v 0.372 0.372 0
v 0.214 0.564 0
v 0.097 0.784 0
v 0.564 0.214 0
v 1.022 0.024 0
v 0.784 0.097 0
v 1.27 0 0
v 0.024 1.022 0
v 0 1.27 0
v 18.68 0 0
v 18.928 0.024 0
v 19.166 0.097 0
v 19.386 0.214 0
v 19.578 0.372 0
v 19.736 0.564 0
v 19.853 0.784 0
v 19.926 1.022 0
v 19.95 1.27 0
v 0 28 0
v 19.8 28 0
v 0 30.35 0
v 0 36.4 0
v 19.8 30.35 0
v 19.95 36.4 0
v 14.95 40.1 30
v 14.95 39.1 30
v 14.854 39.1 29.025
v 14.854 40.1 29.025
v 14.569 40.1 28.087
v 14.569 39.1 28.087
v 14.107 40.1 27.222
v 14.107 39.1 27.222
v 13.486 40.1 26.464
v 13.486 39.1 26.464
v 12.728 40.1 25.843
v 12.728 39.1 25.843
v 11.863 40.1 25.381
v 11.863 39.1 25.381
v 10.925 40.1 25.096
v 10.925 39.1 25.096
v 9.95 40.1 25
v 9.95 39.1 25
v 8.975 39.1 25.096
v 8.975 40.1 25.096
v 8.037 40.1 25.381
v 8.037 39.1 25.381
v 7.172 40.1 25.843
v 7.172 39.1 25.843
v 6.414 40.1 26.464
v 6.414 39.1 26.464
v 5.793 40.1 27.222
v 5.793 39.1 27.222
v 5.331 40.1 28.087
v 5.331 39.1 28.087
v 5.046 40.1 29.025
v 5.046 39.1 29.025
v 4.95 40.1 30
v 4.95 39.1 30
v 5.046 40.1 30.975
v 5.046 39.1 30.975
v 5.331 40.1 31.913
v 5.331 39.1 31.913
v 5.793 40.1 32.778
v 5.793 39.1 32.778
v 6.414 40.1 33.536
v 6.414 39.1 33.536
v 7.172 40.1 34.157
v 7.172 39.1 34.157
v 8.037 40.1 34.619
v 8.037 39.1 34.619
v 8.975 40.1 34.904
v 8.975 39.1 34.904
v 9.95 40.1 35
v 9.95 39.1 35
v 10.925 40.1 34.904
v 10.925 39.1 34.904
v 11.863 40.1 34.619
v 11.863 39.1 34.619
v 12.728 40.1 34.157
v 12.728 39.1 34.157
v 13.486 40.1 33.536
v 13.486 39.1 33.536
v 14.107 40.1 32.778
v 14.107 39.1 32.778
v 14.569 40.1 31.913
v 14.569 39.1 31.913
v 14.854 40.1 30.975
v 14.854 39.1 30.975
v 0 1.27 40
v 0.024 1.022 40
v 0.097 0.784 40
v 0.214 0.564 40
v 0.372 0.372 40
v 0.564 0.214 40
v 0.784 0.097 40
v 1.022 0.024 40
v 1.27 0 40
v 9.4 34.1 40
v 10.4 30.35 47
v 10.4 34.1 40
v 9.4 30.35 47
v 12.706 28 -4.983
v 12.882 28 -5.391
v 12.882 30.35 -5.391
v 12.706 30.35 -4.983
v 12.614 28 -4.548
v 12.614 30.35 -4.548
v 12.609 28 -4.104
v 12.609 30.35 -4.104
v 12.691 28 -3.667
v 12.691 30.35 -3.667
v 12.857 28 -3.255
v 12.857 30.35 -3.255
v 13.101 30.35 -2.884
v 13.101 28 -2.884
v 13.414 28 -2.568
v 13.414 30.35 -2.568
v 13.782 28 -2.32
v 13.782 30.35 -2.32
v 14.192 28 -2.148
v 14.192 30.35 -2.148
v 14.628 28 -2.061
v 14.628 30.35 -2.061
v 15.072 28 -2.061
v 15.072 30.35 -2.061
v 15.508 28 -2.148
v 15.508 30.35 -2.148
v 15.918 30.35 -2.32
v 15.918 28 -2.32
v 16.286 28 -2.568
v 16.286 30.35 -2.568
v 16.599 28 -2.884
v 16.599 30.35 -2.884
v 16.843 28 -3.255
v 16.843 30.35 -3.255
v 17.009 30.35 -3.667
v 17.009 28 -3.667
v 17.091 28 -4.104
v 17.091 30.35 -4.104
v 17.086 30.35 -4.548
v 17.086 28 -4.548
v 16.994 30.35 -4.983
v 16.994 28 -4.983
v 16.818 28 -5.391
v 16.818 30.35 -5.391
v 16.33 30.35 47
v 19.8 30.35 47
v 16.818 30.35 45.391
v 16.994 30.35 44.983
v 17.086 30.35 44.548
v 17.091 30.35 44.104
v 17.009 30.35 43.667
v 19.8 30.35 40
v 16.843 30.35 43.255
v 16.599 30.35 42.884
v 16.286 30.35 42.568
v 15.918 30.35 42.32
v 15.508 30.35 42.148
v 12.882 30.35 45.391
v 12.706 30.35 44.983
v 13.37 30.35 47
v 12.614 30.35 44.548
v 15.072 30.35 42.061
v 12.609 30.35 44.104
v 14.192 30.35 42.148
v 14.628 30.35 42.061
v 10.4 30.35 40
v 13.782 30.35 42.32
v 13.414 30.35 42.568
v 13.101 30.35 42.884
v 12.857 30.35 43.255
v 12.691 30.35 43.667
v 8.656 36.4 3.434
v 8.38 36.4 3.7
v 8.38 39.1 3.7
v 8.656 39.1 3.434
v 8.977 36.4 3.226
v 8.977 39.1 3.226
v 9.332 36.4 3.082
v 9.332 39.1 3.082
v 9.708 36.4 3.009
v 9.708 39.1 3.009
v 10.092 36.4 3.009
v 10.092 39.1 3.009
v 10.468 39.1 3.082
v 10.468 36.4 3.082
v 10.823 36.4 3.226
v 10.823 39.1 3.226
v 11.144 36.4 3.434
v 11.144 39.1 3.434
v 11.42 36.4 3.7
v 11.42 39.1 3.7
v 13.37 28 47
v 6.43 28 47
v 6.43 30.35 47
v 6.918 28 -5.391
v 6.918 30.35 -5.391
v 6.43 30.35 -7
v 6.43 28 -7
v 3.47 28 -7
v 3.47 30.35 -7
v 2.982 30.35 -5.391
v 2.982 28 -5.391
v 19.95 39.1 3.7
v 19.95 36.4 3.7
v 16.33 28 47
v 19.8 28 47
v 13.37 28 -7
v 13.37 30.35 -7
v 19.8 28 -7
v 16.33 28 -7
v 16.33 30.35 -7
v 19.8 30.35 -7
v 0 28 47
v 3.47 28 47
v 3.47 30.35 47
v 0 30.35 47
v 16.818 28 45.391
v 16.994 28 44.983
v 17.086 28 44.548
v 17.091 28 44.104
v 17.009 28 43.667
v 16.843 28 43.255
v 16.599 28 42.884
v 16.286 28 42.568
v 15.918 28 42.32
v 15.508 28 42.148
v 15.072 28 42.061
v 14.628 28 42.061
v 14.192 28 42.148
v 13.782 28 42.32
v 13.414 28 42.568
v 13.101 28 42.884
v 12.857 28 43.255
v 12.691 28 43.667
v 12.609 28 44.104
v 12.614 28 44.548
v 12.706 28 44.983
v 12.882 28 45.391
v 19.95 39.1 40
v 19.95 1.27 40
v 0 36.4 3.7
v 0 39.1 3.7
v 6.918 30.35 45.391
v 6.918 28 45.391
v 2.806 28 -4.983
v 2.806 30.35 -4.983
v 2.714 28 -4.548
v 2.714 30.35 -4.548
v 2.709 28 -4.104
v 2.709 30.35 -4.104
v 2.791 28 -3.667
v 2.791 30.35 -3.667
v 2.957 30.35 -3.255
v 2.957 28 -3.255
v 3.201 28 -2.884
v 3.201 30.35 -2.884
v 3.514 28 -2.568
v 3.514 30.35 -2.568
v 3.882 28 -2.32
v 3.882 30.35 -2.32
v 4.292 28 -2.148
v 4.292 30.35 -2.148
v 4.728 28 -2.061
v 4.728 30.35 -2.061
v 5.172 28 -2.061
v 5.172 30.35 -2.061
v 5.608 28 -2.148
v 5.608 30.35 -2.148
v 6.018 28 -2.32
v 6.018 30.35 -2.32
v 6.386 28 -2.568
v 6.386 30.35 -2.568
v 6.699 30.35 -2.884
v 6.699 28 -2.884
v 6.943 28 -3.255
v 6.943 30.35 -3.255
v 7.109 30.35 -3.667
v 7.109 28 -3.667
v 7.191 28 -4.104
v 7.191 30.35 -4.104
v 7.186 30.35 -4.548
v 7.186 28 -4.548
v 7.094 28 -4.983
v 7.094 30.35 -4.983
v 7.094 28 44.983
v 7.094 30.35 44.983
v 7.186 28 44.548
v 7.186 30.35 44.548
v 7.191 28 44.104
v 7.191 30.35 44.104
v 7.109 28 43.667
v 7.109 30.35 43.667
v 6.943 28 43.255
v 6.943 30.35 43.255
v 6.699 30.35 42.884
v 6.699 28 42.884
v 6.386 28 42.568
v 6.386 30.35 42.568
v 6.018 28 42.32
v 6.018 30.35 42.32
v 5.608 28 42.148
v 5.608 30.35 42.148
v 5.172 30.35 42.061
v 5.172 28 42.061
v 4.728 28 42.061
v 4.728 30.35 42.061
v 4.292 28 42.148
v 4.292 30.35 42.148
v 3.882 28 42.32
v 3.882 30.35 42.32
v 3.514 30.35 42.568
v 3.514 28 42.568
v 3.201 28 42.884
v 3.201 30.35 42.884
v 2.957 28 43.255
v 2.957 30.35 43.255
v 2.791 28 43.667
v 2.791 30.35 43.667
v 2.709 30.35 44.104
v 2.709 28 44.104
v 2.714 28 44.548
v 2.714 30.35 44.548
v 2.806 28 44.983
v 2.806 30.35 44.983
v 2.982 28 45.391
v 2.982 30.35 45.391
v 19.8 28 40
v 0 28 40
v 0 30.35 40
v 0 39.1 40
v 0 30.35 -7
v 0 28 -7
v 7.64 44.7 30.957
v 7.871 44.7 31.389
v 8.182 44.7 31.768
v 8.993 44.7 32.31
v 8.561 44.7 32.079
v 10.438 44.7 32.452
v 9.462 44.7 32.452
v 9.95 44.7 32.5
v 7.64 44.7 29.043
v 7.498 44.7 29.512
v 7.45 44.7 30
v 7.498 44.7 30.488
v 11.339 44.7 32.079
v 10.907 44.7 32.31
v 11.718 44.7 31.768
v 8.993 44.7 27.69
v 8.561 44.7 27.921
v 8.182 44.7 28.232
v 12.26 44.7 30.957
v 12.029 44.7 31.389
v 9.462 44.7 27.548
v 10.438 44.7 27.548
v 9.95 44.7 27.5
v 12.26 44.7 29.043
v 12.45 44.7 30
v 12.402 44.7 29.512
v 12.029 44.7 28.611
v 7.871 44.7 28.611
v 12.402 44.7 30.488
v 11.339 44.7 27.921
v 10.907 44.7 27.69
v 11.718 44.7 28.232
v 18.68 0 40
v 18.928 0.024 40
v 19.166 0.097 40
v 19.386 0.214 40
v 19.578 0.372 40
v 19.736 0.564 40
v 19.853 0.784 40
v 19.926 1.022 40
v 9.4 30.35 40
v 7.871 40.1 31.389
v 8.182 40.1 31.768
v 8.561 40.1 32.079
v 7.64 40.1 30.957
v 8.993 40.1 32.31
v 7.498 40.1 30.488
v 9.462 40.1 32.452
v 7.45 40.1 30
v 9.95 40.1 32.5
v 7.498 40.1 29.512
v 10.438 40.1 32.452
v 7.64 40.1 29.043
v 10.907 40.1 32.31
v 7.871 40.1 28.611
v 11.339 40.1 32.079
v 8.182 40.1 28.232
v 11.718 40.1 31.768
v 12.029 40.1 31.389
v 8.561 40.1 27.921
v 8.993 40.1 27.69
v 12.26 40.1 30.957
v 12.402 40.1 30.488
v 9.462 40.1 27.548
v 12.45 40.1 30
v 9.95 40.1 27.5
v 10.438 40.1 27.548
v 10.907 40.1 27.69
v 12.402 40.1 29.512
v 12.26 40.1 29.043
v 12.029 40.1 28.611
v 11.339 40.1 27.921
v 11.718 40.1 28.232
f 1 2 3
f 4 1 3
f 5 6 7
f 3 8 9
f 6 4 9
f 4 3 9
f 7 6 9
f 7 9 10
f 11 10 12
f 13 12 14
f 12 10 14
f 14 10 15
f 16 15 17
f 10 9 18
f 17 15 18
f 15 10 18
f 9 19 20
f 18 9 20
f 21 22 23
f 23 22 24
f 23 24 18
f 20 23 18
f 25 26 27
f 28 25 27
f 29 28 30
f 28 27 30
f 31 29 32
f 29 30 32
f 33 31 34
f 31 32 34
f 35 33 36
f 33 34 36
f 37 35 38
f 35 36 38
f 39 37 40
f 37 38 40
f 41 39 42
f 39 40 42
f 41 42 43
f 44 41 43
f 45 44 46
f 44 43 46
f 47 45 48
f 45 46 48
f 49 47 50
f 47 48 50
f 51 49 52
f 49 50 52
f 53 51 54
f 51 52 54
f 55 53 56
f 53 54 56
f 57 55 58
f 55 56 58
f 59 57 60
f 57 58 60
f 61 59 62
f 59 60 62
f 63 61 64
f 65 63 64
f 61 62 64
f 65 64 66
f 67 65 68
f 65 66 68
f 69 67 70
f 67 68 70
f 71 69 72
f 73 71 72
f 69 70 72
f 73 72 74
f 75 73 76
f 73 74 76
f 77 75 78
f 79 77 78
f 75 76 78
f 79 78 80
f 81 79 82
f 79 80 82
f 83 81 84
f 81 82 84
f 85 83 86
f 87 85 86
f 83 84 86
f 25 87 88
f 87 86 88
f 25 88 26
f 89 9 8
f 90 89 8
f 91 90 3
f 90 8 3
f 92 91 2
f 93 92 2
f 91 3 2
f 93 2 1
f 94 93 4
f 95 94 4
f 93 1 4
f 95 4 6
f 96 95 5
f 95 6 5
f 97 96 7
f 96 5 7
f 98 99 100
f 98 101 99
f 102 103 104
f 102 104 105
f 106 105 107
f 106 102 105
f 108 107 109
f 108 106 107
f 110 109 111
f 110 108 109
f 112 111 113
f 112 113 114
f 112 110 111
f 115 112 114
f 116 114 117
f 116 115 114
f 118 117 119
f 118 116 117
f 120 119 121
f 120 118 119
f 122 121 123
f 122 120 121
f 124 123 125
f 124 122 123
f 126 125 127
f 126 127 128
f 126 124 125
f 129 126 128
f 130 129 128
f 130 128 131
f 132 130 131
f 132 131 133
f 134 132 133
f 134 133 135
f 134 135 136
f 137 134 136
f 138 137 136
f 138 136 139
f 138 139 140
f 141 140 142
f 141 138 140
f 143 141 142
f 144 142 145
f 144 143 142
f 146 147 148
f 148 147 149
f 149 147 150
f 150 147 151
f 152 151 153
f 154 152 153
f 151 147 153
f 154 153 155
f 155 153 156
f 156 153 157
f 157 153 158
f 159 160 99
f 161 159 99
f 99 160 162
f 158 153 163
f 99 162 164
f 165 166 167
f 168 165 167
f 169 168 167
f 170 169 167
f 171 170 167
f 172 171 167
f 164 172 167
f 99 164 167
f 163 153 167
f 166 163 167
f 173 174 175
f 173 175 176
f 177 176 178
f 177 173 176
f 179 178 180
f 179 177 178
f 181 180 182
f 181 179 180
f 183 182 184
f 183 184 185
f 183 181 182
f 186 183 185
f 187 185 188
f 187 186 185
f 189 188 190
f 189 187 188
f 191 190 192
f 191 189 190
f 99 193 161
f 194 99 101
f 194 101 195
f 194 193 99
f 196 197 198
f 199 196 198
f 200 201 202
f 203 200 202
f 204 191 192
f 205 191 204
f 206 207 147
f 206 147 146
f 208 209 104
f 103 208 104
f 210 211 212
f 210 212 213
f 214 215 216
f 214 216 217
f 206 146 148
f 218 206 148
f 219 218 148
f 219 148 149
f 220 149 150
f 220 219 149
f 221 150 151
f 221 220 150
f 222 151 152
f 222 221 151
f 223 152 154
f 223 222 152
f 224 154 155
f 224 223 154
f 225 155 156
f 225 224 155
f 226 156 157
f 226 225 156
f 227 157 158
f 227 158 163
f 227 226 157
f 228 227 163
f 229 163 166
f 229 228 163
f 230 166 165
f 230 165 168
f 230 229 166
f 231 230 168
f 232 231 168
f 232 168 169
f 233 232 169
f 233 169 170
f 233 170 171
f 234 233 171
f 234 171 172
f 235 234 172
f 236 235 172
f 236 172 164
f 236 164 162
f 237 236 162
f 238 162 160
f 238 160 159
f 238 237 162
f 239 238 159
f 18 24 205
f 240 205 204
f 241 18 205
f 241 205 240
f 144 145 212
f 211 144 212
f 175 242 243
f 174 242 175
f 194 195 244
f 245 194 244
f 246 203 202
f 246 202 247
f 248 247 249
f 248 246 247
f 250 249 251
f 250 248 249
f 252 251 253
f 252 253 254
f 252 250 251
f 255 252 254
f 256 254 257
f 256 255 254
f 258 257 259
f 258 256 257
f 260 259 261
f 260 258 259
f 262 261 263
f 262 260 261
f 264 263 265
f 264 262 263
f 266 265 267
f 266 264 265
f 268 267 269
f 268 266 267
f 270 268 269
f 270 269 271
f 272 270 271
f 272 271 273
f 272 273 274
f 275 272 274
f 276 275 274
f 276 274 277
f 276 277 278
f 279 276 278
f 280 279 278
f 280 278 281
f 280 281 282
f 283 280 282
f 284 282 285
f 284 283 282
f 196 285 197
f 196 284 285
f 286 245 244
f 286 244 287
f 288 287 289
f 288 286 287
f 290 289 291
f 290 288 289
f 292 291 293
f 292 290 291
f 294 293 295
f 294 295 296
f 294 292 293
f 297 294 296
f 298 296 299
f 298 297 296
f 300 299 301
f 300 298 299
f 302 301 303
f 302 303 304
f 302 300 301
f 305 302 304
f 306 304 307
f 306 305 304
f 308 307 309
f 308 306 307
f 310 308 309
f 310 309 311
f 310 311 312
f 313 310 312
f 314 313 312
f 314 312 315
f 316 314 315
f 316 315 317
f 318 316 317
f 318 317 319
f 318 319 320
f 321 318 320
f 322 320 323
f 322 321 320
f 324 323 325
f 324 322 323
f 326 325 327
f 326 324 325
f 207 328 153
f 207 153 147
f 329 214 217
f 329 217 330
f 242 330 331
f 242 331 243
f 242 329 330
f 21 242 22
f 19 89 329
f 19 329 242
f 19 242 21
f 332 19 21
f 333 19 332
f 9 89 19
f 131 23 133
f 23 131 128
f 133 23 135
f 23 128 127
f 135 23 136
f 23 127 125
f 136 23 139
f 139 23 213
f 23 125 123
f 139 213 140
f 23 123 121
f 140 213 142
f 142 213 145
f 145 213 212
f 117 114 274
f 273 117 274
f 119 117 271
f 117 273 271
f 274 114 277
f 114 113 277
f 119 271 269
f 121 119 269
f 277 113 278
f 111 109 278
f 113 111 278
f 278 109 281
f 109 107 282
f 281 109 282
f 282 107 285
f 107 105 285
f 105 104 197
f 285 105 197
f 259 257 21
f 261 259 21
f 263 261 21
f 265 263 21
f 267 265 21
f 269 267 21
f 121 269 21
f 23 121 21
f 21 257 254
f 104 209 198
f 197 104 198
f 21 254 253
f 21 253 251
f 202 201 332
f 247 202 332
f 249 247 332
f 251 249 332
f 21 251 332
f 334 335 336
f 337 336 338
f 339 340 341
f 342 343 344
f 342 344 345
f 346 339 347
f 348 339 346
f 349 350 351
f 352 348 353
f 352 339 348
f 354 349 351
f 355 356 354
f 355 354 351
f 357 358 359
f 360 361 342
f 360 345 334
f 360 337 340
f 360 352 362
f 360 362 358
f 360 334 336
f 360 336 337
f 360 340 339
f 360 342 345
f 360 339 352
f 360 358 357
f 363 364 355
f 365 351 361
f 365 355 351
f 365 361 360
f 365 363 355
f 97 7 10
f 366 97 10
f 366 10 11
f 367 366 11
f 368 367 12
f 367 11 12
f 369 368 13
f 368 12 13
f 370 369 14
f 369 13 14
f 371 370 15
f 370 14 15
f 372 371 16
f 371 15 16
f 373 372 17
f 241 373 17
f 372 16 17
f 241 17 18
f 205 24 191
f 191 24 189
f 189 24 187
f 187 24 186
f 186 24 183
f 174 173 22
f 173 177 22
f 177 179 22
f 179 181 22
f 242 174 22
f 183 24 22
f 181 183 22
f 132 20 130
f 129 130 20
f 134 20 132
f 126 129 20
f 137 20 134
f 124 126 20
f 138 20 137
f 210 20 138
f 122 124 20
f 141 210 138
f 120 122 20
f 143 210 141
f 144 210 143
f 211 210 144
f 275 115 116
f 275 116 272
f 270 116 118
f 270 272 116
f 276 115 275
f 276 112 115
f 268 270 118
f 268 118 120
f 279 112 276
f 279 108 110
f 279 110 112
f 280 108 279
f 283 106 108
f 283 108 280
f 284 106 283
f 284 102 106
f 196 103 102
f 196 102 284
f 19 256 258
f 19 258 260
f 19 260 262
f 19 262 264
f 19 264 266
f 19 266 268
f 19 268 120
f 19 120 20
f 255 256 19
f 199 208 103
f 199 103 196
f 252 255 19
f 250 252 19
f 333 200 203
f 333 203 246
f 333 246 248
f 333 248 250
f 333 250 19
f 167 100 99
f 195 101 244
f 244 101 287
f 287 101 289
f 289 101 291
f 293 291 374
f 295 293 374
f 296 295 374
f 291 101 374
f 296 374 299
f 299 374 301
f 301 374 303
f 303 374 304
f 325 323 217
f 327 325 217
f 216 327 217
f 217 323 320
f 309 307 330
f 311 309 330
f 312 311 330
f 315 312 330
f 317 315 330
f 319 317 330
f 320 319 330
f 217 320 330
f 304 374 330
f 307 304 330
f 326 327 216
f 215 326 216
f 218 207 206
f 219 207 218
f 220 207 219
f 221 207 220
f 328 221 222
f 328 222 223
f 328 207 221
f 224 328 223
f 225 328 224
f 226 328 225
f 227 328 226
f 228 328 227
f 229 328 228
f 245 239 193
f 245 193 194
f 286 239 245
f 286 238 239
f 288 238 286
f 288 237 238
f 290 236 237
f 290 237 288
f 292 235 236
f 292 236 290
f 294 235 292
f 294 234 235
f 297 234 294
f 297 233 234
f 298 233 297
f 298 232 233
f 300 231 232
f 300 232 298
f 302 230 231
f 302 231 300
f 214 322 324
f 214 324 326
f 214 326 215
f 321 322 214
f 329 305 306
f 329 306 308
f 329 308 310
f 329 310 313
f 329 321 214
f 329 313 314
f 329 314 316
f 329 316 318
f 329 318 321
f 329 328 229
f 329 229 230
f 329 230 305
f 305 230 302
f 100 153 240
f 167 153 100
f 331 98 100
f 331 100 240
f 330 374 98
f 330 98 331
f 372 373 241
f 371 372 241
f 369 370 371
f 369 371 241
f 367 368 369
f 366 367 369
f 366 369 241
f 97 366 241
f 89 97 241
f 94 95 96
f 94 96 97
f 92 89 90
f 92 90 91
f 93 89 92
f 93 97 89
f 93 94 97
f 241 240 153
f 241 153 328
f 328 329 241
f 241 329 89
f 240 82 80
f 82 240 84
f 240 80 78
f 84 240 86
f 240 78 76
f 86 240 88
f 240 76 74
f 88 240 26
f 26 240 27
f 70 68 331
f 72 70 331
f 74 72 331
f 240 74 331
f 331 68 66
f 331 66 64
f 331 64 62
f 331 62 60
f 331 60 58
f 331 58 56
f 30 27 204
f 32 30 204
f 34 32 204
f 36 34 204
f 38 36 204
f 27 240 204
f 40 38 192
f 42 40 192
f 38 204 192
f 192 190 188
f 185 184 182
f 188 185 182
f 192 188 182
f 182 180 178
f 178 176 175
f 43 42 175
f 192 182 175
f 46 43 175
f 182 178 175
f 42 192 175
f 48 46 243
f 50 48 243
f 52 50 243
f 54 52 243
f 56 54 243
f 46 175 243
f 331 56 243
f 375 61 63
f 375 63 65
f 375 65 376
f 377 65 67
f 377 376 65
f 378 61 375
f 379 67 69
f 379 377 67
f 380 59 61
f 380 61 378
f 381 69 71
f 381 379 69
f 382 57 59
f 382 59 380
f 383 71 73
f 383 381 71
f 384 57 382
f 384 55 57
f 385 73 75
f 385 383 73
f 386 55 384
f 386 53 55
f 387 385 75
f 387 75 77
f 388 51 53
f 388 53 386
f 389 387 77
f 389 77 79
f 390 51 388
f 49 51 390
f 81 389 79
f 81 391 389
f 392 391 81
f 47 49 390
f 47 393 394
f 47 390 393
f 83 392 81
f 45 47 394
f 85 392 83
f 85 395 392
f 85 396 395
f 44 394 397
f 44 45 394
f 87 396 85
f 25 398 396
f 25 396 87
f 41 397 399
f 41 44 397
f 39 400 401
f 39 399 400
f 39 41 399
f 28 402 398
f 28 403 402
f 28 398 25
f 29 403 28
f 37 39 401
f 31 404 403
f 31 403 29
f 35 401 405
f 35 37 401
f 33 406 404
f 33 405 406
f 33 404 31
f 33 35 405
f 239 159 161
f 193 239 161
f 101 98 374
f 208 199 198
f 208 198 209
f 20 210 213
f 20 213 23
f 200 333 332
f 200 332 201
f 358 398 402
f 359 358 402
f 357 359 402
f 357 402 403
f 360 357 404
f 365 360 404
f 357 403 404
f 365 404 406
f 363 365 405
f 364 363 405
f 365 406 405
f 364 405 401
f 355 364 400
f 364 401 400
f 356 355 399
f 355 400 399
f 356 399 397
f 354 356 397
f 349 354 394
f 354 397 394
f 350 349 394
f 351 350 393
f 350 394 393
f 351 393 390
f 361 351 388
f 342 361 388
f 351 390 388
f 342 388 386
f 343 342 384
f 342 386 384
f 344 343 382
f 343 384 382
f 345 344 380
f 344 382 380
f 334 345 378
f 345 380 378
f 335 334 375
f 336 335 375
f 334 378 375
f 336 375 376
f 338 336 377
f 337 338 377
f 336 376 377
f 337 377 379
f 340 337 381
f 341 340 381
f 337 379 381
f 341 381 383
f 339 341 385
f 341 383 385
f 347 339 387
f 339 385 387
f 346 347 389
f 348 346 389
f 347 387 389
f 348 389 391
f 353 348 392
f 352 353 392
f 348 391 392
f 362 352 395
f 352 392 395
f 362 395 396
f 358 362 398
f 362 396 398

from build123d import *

# Parameters (mm, degrees)
BOSS_EXTRUDE1_DEPTH = 40
BOSS_EXTRUDE3_DEPTH = 2.35
BOSS_EXTRUDE4_DEPTH = 2.7
SKETCH7_R           = 5
BOSS_EXTRUDE5_DEPTH = 1
SKETCH8_R           = 2.5
BOSS_EXTRUDE6_DEPTH = 4.6
BOSS_EXTRUDE7_DEPTH = 0.5


with BuildPart() as part:
    # Sketch1 → Boss-Extrude1 (new body)
    with BuildSketch(Plane.XY):
        with BuildLine():
            Line((1.27, 0), (18.68, 0))
            ThreePointArc((18.68, 0), (19.578025612, 0.371974388), (19.95, 1.27))
            Line((19.95, 1.27), (19.95, 36.4))
            Line((19.95, 36.4), (0, 36.4))
            Line((0, 36.4), (0, 1.27))
            ThreePointArc((0, 1.27), (0.371974388, 0.371974388), (1.27, 0))
        make_face()
    extrude(amount=BOSS_EXTRUDE1_DEPTH)

    # Sketch5 → Boss-Extrude3 (add)
    with BuildSketch(Plane(origin=(0, 28, 0), x_dir=(-1, 0, 0), z_dir=(0, -1, 0))):
        with BuildLine():
            Line((0, 0), (0, 7))
            Line((0, 7), (-3.470401751, 7))
            Line((-3.470401751, 7), (-2.98203275, 5.390690104))
            ThreePointArc((-2.98203275, 5.390690104), (-4.95, 2.05), (-6.91796725, 5.390690104))
            Line((-6.91796725, 5.390690104), (-6.429598249, 7))
            Line((-6.429598249, 7), (-13.370401751, 7))
            Line((-13.370401751, 7), (-12.88203275, 5.390690104))
            ThreePointArc((-12.88203275, 5.390690104), (-14.85, 2.05), (-16.81796725, 5.390690104))
            Line((-16.81796725, 5.390690104), (-16.329598249, 7))
            Line((-16.329598249, 7), (-19.8, 7))
            Line((-19.8, 7), (-19.8, 0))
            Line((-19.8, 0), (0, 0))
        make_face()
        with BuildLine():
            Line((-16.329598249, -47), (-16.81796725, -45.390690104))
            ThreePointArc((-16.81796725, -45.390690104), (-14.85, -42.05), (-12.88203275, -45.390690104))
            Line((-12.88203275, -45.390690104), (-13.370401751, -47))
            Line((-13.370401751, -47), (-6.429598249, -47))
            Line((-6.429598249, -47), (-6.91796725, -45.390690104))
            ThreePointArc((-6.91796725, -45.390690104), (-4.95, -42.05), (-2.98203275, -45.390690104))
            Line((-2.98203275, -45.390690104), (-3.470401751, -47))
            Line((-3.470401751, -47), (0, -47))
            Line((0, -47), (0, -40))
            Line((0, -40), (-19.8, -40))
            Line((-19.8, -40), (-19.8, -47))
            Line((-19.8, -47), (-16.329598249, -47))
        make_face()
    extrude(amount=-BOSS_EXTRUDE3_DEPTH)

    # Sketch6 → Boss-Extrude4 (add)
    with BuildSketch(Plane(origin=(0, 36.4, 0), x_dir=(1, 0, 0), z_dir=(0, 1, 0))):
        with BuildLine():
            Line((19.95, -3.7), (19.95, -40))
            Line((19.95, -40), (0, -40))
            Line((0, -40), (0, -3.7))
            Line((0, -3.7), (8.380131585, -3.7))
            ThreePointArc((8.380131585, -3.7), (9.9, -3), (11.419868415, -3.7))
            Line((11.419868415, -3.7), (19.95, -3.7))
        make_face()
    extrude(amount=BOSS_EXTRUDE4_DEPTH)

    # Sketch7 → Boss-Extrude5 (add)
    with BuildSketch(Plane(origin=(0, 39.1, 0), x_dir=(1, 0, 0), z_dir=(0, 1, 0))):
        with Locations((9.95, -30)):
            Circle(SKETCH7_R)
    extrude(amount=BOSS_EXTRUDE5_DEPTH)

    # Sketch8 → Boss-Extrude6 (add)
    with BuildSketch(Plane(origin=(0, 40.1, 0), x_dir=(1, 0, 0), z_dir=(0, 1, 0))):
        with Locations((9.95, -30)):
            Circle(SKETCH8_R)
    extrude(amount=BOSS_EXTRUDE6_DEPTH)

    # Sketch9 → Boss-Extrude7 (add, symmetric)
    with BuildSketch(Plane.ZY.offset(-9.9)):
        Polygon((47, 30.35), (40, 34.1), (40, 30.35), align=None)
    extrude(amount=BOSS_EXTRUDE7_DEPTH, both=True)


solid = part.part
